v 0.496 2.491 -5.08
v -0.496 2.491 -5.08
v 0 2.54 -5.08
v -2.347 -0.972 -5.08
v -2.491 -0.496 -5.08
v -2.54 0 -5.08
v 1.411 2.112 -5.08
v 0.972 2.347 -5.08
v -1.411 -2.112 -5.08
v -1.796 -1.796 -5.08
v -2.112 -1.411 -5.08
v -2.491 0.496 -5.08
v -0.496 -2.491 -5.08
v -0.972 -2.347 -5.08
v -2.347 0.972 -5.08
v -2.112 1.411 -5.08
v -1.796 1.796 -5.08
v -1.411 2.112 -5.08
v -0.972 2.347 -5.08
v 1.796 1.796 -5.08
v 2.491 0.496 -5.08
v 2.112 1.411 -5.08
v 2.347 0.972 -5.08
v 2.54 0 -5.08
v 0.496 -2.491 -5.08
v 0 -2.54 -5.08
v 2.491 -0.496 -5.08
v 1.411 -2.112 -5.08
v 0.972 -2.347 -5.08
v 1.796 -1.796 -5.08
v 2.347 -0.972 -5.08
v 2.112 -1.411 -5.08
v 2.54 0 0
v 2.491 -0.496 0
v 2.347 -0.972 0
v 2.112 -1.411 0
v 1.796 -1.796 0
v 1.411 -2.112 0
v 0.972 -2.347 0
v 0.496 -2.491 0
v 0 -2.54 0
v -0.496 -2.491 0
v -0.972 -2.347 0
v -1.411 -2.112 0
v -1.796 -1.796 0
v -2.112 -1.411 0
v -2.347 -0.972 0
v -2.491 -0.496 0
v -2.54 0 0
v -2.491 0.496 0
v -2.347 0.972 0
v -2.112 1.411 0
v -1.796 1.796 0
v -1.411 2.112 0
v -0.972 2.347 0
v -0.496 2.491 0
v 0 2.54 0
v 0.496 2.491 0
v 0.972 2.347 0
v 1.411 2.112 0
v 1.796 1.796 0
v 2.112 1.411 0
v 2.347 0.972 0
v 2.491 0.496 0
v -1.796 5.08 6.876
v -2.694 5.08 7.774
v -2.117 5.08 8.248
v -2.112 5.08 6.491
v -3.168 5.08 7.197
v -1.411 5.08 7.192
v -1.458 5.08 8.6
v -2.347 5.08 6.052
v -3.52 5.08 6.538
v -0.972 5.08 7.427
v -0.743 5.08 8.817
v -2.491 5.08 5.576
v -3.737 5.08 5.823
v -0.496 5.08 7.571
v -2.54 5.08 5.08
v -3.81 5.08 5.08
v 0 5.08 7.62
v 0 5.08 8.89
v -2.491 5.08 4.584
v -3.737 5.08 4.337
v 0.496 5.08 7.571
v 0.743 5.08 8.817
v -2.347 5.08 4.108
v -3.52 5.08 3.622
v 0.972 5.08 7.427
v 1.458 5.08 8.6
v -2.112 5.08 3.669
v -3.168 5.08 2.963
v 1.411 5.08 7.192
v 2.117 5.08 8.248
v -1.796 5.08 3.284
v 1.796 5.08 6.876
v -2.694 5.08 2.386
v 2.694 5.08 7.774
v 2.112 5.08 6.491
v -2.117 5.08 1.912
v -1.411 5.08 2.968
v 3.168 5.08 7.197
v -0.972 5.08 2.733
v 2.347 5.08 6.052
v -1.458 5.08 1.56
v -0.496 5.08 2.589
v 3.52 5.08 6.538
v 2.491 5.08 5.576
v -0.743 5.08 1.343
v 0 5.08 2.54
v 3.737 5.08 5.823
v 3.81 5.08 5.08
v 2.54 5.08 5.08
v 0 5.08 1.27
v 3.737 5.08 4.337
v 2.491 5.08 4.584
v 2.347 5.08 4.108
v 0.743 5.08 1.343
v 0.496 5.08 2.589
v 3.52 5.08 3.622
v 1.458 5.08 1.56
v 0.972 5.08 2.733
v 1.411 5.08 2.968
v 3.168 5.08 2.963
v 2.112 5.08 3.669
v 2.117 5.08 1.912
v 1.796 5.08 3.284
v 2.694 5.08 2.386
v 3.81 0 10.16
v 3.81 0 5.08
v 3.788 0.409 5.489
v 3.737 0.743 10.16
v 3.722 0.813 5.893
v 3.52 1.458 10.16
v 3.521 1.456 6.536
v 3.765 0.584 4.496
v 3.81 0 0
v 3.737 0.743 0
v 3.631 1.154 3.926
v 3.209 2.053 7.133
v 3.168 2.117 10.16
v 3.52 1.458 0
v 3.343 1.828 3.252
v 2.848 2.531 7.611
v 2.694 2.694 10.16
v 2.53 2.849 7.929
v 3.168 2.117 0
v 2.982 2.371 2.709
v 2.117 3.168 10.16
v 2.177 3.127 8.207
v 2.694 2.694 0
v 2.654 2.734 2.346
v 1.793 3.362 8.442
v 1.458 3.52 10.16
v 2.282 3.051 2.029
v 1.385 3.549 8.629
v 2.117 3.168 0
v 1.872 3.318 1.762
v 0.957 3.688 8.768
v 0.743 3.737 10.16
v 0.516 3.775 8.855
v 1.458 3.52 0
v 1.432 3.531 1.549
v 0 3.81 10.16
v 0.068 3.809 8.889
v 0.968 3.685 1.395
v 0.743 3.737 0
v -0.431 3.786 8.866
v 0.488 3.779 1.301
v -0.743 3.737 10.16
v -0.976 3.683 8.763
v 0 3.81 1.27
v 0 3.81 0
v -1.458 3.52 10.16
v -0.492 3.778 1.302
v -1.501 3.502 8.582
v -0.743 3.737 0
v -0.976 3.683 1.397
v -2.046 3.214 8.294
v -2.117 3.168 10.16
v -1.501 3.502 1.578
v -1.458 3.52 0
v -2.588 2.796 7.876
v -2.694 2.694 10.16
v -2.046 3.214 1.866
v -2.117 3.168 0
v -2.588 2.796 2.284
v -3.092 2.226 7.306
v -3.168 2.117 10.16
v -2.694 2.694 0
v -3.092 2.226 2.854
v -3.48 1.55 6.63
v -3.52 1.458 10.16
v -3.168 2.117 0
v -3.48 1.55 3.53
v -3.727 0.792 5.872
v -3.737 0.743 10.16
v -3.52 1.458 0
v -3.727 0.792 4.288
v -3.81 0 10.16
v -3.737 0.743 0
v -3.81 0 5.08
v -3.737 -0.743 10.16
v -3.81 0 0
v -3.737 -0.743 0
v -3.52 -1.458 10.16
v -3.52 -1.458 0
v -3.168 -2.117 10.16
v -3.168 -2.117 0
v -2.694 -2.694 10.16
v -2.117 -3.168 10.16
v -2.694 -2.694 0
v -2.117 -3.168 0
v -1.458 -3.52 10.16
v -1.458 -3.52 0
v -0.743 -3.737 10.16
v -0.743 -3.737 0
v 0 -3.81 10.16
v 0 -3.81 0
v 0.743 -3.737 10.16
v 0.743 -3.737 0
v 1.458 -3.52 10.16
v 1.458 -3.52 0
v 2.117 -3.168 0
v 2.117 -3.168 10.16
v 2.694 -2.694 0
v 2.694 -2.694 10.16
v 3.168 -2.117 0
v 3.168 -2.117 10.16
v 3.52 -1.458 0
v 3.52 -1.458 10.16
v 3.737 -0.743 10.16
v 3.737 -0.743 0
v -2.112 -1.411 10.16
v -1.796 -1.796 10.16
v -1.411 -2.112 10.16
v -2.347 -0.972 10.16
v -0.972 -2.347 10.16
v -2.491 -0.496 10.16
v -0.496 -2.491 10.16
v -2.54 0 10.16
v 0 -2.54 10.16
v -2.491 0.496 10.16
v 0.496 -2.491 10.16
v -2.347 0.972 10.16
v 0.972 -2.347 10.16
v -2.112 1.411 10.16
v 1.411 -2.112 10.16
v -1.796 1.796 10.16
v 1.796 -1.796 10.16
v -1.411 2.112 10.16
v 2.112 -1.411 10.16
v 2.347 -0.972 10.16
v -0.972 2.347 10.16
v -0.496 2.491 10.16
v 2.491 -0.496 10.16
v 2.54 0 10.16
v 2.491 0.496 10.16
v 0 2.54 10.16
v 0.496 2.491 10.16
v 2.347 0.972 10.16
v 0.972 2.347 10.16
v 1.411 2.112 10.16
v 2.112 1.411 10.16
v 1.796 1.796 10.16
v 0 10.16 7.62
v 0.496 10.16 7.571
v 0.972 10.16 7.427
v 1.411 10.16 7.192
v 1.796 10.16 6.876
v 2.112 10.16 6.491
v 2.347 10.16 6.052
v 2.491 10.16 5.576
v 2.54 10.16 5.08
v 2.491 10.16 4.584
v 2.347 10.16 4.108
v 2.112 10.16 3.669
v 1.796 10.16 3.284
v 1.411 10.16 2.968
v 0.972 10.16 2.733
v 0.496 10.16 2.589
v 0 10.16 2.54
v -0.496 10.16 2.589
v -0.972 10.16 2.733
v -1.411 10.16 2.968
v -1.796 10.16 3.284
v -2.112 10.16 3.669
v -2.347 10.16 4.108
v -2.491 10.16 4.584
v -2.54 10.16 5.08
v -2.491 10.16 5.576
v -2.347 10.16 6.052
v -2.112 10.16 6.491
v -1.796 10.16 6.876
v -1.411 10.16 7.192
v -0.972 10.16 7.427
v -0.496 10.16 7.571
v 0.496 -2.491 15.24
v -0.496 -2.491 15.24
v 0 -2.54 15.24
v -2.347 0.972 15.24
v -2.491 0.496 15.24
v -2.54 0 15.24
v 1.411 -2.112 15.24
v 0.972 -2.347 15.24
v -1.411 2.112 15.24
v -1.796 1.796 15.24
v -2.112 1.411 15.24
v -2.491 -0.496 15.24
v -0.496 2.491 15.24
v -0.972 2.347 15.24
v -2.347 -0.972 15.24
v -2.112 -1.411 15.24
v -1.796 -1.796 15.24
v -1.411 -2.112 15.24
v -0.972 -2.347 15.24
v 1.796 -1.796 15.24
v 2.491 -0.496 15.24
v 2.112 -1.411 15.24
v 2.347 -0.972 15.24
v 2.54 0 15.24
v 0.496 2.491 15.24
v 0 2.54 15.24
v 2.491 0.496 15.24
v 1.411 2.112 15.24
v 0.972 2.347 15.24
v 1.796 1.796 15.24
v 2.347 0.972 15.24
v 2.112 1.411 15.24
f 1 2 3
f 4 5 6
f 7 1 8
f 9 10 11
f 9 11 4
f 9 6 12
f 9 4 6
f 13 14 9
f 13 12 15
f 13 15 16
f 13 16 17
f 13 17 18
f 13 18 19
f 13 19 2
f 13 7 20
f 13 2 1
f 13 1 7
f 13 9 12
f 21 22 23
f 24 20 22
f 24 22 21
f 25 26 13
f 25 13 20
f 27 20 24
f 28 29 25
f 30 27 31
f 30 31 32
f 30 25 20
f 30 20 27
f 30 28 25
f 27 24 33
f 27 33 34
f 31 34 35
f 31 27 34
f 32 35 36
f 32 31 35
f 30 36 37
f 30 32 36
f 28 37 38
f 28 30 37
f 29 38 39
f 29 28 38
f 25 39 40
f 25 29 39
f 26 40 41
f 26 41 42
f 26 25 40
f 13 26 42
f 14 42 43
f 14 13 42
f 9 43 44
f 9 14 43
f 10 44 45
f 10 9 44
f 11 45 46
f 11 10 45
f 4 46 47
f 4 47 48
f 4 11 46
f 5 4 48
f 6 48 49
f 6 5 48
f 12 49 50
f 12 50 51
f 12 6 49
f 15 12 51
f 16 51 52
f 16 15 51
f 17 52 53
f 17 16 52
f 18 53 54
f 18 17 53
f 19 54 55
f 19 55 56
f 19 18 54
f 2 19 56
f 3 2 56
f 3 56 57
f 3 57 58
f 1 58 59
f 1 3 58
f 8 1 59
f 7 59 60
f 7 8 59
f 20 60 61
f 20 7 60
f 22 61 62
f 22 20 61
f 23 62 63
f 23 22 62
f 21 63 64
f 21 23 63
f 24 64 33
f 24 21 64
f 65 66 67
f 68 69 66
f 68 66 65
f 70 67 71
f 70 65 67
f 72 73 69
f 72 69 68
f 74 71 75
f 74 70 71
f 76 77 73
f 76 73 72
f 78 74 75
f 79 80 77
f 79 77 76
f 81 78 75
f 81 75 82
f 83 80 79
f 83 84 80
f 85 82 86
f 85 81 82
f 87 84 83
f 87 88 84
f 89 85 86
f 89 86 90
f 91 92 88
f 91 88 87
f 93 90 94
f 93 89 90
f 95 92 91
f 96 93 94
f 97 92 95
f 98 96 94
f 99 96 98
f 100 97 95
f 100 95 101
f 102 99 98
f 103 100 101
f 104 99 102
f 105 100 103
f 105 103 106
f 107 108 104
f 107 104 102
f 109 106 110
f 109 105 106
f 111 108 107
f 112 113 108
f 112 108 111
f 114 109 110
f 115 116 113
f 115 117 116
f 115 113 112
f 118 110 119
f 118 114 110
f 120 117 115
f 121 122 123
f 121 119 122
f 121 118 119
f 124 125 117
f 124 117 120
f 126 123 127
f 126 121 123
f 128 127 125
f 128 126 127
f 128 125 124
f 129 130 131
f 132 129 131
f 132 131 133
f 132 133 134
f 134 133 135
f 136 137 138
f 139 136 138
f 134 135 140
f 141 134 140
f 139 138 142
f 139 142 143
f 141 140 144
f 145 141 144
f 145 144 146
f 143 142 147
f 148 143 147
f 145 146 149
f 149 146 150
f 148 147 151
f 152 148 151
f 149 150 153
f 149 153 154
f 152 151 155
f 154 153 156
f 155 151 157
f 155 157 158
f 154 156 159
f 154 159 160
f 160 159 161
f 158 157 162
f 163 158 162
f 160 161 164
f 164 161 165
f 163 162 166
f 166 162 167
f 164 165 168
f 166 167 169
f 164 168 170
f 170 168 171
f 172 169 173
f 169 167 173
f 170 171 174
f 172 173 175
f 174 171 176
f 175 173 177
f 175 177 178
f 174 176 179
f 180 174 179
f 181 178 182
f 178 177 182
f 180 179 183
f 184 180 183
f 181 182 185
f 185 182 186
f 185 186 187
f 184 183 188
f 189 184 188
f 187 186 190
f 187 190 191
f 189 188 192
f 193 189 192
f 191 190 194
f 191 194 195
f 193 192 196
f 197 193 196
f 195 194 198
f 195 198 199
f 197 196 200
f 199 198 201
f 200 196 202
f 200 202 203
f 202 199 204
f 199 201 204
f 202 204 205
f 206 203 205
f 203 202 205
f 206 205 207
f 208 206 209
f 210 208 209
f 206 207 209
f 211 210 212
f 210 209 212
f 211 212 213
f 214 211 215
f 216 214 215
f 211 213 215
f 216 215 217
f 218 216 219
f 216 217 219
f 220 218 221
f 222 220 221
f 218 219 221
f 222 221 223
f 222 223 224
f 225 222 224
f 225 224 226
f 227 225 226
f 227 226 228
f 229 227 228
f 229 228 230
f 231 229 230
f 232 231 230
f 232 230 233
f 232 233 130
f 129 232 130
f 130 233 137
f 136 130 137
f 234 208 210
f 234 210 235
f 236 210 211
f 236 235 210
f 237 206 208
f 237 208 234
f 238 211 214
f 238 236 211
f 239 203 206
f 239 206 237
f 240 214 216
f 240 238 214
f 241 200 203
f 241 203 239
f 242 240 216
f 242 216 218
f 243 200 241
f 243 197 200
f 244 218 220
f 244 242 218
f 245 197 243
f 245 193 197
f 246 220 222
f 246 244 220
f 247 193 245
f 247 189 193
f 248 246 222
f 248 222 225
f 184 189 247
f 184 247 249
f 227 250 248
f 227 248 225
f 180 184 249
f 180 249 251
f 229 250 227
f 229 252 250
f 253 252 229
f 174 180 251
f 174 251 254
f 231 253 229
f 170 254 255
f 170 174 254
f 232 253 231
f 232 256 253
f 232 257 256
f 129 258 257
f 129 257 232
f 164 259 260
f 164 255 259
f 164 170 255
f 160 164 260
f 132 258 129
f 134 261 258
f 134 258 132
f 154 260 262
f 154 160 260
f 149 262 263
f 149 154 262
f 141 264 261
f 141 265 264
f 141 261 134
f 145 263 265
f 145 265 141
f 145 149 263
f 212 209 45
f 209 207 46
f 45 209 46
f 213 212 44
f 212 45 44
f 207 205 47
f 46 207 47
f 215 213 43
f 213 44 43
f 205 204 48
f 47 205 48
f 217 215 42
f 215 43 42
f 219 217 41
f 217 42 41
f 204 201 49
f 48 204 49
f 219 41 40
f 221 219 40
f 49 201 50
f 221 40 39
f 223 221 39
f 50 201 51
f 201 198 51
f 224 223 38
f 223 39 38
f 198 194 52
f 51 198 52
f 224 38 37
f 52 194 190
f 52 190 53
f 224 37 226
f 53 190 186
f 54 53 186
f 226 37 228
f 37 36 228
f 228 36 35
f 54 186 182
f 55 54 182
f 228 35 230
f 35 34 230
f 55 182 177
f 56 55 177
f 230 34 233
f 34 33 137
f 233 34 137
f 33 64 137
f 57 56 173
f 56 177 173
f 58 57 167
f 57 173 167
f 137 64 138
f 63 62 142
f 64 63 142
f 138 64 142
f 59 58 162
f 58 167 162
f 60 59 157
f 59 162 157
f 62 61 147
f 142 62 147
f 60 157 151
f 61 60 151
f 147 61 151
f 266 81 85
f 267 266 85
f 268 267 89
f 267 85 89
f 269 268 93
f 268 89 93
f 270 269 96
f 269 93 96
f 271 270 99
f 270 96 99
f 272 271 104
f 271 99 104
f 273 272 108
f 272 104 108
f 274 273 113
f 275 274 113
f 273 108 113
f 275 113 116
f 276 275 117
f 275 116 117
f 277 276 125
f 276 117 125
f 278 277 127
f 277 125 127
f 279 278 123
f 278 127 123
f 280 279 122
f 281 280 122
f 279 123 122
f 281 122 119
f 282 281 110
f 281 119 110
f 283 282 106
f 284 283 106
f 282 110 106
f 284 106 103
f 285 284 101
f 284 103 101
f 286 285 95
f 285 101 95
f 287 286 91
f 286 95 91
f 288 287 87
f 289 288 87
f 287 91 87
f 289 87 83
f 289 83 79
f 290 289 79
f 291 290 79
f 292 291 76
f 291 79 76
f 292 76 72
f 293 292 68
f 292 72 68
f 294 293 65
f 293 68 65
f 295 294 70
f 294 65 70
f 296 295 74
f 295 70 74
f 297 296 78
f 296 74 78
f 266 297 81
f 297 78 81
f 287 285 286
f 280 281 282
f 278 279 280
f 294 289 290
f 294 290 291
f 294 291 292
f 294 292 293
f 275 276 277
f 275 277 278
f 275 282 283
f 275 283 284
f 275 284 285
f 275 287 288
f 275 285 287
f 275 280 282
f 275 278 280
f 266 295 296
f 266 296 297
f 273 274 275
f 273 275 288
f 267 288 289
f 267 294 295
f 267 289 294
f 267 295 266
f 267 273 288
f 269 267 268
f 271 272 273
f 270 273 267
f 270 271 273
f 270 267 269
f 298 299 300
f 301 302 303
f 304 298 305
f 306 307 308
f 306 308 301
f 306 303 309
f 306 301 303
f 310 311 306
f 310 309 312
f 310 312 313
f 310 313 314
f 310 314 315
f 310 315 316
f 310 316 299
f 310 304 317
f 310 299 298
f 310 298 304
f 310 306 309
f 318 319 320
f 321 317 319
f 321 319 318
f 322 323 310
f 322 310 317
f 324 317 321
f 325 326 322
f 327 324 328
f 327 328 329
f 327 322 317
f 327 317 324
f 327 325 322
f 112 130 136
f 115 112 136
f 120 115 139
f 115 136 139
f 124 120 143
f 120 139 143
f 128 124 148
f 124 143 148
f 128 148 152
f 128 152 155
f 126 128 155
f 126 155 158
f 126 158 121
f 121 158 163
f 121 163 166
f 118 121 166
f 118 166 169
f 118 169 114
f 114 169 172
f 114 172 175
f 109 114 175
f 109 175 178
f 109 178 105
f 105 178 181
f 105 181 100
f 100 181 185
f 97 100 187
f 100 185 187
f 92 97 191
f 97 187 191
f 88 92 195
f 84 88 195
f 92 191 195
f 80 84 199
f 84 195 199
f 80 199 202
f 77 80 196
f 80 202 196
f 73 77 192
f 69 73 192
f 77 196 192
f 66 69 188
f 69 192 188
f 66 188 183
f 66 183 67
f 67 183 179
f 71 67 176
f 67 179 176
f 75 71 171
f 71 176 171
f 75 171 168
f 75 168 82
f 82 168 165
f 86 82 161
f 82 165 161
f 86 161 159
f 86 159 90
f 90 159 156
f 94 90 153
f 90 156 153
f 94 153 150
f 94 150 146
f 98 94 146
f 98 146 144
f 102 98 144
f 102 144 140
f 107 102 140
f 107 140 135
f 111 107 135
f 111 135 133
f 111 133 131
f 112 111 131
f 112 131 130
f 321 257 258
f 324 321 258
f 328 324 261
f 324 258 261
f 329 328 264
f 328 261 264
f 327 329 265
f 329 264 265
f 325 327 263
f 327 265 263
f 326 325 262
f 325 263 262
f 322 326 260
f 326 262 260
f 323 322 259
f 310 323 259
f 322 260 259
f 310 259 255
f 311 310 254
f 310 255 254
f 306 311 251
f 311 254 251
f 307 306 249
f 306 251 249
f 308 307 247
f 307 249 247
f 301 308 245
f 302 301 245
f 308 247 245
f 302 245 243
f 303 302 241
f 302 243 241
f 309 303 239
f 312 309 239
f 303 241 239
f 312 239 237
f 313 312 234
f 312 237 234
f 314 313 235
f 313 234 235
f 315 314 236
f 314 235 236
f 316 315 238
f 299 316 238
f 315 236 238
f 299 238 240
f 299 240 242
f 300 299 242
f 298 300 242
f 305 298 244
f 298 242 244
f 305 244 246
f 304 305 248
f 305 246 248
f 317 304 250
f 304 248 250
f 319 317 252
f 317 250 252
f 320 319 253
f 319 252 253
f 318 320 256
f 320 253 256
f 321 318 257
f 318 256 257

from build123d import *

# Parameters (mm, degrees)
SKETCH2_R           = 3.81
BOSS_EXTRUDE1_DEPTH = 10.16
SKETCH3_R           = 2.54
BOSS_EXTRUDE2_DEPTH = 5.08
BOSS_EXTRUDE3_START = 5.08
SKETCH4_R           = 2.54
BOSS_EXTRUDE3_DEPTH = 5.08
SKETCH5_R           = 3.81
BOSS_EXTRUDE4_DEPTH = 5.08
SKETCH6_R           = 2.54
BOSS_EXTRUDE5_DEPTH = 5.08


with BuildPart() as part:
    # Sketch2 → Boss-Extrude1 (new body)
    with BuildSketch(Plane.XY):
        Circle(SKETCH2_R)
    extrude(amount=BOSS_EXTRUDE1_DEPTH)

    # Sketch3 → Boss-Extrude2 (add)
    with BuildSketch(Plane.XY.offset(10.16)):
        Circle(SKETCH3_R)
    extrude(amount=BOSS_EXTRUDE2_DEPTH)

    # Sketch4 → Boss-Extrude3 (add)
    with BuildSketch(Plane(origin=(0, 0, 0), x_dir=(-1, 0, 0), z_dir=(0, 0, -1)).offset(BOSS_EXTRUDE3_START)):
        with Locations(Location((0, 0, 0), (0, 0, 180))):
            Circle(SKETCH4_R)
    extrude(amount=-BOSS_EXTRUDE3_DEPTH)

    # Sketch5 → Boss-Extrude4 (add)
    with BuildSketch(Plane(origin=(0, 0, 0), x_dir=(1, 0, 0), z_dir=(0, 1, 0))):
        with Locations((0, -5.08)):
            Circle(SKETCH5_R)
    extrude(amount=BOSS_EXTRUDE4_DEPTH)

    # Sketch6 → Boss-Extrude5 (add)
    with BuildSketch(Plane(origin=(0, 5.08, 0), x_dir=(1, 0, 0), z_dir=(0, 1, 0))):
        with Locations(Location((0, -5.08, 0), (0, 0, 270))):
            Circle(SKETCH6_R)
    extrude(amount=BOSS_EXTRUDE5_DEPTH)


solid = part.part
